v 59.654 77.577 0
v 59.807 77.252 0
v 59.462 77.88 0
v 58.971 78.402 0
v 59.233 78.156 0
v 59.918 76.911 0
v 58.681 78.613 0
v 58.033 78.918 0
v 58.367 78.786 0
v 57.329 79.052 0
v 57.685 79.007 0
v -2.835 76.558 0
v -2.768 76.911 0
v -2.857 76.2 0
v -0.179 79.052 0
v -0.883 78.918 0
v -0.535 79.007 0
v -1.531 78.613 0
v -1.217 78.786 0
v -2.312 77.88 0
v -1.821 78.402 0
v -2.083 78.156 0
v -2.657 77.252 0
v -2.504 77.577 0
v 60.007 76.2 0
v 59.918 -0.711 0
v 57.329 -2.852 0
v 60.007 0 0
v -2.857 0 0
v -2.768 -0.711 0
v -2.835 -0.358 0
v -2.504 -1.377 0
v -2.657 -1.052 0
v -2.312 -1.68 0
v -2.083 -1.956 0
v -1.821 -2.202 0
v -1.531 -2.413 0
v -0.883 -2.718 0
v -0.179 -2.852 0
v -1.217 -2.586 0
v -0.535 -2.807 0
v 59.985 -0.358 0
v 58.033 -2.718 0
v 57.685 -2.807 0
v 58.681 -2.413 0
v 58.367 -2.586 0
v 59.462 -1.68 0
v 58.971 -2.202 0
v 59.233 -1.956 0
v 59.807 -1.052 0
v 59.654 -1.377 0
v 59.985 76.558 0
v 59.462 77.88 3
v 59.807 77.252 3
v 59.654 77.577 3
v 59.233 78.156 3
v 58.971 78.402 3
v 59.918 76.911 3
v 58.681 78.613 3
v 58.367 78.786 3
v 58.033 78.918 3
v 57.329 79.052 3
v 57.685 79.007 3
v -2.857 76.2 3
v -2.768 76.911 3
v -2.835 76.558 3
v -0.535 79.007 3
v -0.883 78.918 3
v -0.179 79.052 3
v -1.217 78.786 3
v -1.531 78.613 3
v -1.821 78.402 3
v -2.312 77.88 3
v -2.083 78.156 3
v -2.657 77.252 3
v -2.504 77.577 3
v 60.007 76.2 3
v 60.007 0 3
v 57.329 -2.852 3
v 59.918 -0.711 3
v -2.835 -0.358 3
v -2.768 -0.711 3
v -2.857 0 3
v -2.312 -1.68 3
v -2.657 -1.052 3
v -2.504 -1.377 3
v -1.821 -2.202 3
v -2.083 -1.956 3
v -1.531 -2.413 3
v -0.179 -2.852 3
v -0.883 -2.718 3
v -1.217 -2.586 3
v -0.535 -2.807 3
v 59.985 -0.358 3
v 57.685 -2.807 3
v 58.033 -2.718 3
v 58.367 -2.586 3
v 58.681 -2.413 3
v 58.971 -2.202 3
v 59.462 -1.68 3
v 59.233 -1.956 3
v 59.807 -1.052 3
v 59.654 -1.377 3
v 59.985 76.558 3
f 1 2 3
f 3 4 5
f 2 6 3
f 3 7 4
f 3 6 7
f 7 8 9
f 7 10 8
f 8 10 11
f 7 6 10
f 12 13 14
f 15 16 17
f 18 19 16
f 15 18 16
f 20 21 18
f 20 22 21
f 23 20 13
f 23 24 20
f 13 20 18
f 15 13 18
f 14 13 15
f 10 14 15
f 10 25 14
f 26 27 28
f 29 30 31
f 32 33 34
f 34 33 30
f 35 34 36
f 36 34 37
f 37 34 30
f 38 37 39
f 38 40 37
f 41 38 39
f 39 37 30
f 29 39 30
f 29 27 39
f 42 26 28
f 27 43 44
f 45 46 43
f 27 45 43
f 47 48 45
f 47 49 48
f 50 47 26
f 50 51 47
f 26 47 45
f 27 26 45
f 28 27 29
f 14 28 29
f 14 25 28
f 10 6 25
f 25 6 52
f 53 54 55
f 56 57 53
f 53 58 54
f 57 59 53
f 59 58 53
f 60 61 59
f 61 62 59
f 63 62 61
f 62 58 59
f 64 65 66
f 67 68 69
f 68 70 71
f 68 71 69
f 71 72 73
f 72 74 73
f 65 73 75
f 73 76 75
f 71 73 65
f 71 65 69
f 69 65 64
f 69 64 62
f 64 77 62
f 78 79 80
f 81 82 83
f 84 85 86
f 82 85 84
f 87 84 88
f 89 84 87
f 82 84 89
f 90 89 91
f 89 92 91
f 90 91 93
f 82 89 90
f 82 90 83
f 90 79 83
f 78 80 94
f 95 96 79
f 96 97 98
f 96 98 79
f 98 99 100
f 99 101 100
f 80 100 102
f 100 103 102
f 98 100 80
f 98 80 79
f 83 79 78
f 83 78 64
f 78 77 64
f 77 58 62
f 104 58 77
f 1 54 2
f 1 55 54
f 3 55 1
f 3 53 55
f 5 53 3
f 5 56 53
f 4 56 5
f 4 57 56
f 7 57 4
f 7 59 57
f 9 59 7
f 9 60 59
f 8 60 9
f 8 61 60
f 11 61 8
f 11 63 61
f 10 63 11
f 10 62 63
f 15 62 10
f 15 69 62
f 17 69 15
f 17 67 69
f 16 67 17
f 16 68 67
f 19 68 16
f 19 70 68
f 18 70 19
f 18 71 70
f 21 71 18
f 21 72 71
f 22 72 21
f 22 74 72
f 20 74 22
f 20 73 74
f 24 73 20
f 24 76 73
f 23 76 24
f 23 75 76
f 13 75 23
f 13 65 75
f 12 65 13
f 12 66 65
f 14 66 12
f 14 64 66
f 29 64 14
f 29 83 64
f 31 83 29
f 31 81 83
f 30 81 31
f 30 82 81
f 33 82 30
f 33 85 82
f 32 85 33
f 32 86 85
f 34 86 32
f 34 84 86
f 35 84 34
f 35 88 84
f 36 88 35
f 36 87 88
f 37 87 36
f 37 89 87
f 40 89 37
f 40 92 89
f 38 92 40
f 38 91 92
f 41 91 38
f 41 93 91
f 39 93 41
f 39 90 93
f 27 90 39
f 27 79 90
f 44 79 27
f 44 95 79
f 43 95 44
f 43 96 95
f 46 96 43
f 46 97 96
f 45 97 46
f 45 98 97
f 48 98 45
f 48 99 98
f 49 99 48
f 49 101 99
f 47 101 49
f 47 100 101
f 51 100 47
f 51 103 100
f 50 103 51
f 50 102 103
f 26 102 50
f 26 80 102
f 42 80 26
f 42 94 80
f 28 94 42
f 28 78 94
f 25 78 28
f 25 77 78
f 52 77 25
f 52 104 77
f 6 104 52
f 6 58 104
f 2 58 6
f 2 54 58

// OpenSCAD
linear_extrude (height=3){
  minkowski () {
    translate ([0, 0, ]) {
      union () {
        translate ([0.0, 0.0, ]) {
          translate ([9.525, 9.525, ]) {
            square ([19.05, 19.05], center=true);
          }
        }
        translate ([19.05, 0.0, ]) {
          translate ([9.525, 9.525, ]) {
            square ([19.05, 19.05], center=true);
          }
        }
        translate ([38.1, 0.0, ]) {
          translate ([9.525, 9.525, ]) {
            square ([19.05, 19.05], center=true);
          }
        }
        translate ([0.0, 19.05, ]) {
          translate ([9.525, 9.525, ]) {
            square ([19.05, 19.05], center=true);
          }
        }
        translate ([19.05, 19.05, ]) {
          translate ([9.525, 9.525, ]) {
            square ([19.05, 19.05], center=true);
          }
        }
        translate ([38.1, 19.05, ]) {
          translate ([9.525, 9.525, ]) {
            square ([19.05, 19.05], center=true);
          }
        }
        translate ([0.0, 38.1, ]) {
          translate ([9.525, 9.525, ]) {
            square ([19.05, 19.05], center=true);
          }
        }
        translate ([19.05, 38.1, ]) {
          translate ([9.525, 9.525, ]) {
            square ([19.05, 19.05], center=true);
          }
        }
        translate ([38.1, 38.1, ]) {
          translate ([9.525, 9.525, ]) {
            square ([19.05, 19.05], center=true);
          }
        }
        translate ([0.0, 57.150000000000006, ]) {
          translate ([9.525, 9.525, ]) {
            square ([19.05, 19.05], center=true);
          }
        }
        translate ([19.05, 57.150000000000006, ]) {
          translate ([9.525, 9.525, ]) {
            square ([19.05, 19.05], center=true);
          }
        }
        translate ([38.1, 57.150000000000006, ]) {
          translate ([9.525, 9.525, ]) {
            square ([19.05, 19.05], center=true);
          }
        }
      }
    }
    circle ($fn=50, r=2.8575);
  }
}
